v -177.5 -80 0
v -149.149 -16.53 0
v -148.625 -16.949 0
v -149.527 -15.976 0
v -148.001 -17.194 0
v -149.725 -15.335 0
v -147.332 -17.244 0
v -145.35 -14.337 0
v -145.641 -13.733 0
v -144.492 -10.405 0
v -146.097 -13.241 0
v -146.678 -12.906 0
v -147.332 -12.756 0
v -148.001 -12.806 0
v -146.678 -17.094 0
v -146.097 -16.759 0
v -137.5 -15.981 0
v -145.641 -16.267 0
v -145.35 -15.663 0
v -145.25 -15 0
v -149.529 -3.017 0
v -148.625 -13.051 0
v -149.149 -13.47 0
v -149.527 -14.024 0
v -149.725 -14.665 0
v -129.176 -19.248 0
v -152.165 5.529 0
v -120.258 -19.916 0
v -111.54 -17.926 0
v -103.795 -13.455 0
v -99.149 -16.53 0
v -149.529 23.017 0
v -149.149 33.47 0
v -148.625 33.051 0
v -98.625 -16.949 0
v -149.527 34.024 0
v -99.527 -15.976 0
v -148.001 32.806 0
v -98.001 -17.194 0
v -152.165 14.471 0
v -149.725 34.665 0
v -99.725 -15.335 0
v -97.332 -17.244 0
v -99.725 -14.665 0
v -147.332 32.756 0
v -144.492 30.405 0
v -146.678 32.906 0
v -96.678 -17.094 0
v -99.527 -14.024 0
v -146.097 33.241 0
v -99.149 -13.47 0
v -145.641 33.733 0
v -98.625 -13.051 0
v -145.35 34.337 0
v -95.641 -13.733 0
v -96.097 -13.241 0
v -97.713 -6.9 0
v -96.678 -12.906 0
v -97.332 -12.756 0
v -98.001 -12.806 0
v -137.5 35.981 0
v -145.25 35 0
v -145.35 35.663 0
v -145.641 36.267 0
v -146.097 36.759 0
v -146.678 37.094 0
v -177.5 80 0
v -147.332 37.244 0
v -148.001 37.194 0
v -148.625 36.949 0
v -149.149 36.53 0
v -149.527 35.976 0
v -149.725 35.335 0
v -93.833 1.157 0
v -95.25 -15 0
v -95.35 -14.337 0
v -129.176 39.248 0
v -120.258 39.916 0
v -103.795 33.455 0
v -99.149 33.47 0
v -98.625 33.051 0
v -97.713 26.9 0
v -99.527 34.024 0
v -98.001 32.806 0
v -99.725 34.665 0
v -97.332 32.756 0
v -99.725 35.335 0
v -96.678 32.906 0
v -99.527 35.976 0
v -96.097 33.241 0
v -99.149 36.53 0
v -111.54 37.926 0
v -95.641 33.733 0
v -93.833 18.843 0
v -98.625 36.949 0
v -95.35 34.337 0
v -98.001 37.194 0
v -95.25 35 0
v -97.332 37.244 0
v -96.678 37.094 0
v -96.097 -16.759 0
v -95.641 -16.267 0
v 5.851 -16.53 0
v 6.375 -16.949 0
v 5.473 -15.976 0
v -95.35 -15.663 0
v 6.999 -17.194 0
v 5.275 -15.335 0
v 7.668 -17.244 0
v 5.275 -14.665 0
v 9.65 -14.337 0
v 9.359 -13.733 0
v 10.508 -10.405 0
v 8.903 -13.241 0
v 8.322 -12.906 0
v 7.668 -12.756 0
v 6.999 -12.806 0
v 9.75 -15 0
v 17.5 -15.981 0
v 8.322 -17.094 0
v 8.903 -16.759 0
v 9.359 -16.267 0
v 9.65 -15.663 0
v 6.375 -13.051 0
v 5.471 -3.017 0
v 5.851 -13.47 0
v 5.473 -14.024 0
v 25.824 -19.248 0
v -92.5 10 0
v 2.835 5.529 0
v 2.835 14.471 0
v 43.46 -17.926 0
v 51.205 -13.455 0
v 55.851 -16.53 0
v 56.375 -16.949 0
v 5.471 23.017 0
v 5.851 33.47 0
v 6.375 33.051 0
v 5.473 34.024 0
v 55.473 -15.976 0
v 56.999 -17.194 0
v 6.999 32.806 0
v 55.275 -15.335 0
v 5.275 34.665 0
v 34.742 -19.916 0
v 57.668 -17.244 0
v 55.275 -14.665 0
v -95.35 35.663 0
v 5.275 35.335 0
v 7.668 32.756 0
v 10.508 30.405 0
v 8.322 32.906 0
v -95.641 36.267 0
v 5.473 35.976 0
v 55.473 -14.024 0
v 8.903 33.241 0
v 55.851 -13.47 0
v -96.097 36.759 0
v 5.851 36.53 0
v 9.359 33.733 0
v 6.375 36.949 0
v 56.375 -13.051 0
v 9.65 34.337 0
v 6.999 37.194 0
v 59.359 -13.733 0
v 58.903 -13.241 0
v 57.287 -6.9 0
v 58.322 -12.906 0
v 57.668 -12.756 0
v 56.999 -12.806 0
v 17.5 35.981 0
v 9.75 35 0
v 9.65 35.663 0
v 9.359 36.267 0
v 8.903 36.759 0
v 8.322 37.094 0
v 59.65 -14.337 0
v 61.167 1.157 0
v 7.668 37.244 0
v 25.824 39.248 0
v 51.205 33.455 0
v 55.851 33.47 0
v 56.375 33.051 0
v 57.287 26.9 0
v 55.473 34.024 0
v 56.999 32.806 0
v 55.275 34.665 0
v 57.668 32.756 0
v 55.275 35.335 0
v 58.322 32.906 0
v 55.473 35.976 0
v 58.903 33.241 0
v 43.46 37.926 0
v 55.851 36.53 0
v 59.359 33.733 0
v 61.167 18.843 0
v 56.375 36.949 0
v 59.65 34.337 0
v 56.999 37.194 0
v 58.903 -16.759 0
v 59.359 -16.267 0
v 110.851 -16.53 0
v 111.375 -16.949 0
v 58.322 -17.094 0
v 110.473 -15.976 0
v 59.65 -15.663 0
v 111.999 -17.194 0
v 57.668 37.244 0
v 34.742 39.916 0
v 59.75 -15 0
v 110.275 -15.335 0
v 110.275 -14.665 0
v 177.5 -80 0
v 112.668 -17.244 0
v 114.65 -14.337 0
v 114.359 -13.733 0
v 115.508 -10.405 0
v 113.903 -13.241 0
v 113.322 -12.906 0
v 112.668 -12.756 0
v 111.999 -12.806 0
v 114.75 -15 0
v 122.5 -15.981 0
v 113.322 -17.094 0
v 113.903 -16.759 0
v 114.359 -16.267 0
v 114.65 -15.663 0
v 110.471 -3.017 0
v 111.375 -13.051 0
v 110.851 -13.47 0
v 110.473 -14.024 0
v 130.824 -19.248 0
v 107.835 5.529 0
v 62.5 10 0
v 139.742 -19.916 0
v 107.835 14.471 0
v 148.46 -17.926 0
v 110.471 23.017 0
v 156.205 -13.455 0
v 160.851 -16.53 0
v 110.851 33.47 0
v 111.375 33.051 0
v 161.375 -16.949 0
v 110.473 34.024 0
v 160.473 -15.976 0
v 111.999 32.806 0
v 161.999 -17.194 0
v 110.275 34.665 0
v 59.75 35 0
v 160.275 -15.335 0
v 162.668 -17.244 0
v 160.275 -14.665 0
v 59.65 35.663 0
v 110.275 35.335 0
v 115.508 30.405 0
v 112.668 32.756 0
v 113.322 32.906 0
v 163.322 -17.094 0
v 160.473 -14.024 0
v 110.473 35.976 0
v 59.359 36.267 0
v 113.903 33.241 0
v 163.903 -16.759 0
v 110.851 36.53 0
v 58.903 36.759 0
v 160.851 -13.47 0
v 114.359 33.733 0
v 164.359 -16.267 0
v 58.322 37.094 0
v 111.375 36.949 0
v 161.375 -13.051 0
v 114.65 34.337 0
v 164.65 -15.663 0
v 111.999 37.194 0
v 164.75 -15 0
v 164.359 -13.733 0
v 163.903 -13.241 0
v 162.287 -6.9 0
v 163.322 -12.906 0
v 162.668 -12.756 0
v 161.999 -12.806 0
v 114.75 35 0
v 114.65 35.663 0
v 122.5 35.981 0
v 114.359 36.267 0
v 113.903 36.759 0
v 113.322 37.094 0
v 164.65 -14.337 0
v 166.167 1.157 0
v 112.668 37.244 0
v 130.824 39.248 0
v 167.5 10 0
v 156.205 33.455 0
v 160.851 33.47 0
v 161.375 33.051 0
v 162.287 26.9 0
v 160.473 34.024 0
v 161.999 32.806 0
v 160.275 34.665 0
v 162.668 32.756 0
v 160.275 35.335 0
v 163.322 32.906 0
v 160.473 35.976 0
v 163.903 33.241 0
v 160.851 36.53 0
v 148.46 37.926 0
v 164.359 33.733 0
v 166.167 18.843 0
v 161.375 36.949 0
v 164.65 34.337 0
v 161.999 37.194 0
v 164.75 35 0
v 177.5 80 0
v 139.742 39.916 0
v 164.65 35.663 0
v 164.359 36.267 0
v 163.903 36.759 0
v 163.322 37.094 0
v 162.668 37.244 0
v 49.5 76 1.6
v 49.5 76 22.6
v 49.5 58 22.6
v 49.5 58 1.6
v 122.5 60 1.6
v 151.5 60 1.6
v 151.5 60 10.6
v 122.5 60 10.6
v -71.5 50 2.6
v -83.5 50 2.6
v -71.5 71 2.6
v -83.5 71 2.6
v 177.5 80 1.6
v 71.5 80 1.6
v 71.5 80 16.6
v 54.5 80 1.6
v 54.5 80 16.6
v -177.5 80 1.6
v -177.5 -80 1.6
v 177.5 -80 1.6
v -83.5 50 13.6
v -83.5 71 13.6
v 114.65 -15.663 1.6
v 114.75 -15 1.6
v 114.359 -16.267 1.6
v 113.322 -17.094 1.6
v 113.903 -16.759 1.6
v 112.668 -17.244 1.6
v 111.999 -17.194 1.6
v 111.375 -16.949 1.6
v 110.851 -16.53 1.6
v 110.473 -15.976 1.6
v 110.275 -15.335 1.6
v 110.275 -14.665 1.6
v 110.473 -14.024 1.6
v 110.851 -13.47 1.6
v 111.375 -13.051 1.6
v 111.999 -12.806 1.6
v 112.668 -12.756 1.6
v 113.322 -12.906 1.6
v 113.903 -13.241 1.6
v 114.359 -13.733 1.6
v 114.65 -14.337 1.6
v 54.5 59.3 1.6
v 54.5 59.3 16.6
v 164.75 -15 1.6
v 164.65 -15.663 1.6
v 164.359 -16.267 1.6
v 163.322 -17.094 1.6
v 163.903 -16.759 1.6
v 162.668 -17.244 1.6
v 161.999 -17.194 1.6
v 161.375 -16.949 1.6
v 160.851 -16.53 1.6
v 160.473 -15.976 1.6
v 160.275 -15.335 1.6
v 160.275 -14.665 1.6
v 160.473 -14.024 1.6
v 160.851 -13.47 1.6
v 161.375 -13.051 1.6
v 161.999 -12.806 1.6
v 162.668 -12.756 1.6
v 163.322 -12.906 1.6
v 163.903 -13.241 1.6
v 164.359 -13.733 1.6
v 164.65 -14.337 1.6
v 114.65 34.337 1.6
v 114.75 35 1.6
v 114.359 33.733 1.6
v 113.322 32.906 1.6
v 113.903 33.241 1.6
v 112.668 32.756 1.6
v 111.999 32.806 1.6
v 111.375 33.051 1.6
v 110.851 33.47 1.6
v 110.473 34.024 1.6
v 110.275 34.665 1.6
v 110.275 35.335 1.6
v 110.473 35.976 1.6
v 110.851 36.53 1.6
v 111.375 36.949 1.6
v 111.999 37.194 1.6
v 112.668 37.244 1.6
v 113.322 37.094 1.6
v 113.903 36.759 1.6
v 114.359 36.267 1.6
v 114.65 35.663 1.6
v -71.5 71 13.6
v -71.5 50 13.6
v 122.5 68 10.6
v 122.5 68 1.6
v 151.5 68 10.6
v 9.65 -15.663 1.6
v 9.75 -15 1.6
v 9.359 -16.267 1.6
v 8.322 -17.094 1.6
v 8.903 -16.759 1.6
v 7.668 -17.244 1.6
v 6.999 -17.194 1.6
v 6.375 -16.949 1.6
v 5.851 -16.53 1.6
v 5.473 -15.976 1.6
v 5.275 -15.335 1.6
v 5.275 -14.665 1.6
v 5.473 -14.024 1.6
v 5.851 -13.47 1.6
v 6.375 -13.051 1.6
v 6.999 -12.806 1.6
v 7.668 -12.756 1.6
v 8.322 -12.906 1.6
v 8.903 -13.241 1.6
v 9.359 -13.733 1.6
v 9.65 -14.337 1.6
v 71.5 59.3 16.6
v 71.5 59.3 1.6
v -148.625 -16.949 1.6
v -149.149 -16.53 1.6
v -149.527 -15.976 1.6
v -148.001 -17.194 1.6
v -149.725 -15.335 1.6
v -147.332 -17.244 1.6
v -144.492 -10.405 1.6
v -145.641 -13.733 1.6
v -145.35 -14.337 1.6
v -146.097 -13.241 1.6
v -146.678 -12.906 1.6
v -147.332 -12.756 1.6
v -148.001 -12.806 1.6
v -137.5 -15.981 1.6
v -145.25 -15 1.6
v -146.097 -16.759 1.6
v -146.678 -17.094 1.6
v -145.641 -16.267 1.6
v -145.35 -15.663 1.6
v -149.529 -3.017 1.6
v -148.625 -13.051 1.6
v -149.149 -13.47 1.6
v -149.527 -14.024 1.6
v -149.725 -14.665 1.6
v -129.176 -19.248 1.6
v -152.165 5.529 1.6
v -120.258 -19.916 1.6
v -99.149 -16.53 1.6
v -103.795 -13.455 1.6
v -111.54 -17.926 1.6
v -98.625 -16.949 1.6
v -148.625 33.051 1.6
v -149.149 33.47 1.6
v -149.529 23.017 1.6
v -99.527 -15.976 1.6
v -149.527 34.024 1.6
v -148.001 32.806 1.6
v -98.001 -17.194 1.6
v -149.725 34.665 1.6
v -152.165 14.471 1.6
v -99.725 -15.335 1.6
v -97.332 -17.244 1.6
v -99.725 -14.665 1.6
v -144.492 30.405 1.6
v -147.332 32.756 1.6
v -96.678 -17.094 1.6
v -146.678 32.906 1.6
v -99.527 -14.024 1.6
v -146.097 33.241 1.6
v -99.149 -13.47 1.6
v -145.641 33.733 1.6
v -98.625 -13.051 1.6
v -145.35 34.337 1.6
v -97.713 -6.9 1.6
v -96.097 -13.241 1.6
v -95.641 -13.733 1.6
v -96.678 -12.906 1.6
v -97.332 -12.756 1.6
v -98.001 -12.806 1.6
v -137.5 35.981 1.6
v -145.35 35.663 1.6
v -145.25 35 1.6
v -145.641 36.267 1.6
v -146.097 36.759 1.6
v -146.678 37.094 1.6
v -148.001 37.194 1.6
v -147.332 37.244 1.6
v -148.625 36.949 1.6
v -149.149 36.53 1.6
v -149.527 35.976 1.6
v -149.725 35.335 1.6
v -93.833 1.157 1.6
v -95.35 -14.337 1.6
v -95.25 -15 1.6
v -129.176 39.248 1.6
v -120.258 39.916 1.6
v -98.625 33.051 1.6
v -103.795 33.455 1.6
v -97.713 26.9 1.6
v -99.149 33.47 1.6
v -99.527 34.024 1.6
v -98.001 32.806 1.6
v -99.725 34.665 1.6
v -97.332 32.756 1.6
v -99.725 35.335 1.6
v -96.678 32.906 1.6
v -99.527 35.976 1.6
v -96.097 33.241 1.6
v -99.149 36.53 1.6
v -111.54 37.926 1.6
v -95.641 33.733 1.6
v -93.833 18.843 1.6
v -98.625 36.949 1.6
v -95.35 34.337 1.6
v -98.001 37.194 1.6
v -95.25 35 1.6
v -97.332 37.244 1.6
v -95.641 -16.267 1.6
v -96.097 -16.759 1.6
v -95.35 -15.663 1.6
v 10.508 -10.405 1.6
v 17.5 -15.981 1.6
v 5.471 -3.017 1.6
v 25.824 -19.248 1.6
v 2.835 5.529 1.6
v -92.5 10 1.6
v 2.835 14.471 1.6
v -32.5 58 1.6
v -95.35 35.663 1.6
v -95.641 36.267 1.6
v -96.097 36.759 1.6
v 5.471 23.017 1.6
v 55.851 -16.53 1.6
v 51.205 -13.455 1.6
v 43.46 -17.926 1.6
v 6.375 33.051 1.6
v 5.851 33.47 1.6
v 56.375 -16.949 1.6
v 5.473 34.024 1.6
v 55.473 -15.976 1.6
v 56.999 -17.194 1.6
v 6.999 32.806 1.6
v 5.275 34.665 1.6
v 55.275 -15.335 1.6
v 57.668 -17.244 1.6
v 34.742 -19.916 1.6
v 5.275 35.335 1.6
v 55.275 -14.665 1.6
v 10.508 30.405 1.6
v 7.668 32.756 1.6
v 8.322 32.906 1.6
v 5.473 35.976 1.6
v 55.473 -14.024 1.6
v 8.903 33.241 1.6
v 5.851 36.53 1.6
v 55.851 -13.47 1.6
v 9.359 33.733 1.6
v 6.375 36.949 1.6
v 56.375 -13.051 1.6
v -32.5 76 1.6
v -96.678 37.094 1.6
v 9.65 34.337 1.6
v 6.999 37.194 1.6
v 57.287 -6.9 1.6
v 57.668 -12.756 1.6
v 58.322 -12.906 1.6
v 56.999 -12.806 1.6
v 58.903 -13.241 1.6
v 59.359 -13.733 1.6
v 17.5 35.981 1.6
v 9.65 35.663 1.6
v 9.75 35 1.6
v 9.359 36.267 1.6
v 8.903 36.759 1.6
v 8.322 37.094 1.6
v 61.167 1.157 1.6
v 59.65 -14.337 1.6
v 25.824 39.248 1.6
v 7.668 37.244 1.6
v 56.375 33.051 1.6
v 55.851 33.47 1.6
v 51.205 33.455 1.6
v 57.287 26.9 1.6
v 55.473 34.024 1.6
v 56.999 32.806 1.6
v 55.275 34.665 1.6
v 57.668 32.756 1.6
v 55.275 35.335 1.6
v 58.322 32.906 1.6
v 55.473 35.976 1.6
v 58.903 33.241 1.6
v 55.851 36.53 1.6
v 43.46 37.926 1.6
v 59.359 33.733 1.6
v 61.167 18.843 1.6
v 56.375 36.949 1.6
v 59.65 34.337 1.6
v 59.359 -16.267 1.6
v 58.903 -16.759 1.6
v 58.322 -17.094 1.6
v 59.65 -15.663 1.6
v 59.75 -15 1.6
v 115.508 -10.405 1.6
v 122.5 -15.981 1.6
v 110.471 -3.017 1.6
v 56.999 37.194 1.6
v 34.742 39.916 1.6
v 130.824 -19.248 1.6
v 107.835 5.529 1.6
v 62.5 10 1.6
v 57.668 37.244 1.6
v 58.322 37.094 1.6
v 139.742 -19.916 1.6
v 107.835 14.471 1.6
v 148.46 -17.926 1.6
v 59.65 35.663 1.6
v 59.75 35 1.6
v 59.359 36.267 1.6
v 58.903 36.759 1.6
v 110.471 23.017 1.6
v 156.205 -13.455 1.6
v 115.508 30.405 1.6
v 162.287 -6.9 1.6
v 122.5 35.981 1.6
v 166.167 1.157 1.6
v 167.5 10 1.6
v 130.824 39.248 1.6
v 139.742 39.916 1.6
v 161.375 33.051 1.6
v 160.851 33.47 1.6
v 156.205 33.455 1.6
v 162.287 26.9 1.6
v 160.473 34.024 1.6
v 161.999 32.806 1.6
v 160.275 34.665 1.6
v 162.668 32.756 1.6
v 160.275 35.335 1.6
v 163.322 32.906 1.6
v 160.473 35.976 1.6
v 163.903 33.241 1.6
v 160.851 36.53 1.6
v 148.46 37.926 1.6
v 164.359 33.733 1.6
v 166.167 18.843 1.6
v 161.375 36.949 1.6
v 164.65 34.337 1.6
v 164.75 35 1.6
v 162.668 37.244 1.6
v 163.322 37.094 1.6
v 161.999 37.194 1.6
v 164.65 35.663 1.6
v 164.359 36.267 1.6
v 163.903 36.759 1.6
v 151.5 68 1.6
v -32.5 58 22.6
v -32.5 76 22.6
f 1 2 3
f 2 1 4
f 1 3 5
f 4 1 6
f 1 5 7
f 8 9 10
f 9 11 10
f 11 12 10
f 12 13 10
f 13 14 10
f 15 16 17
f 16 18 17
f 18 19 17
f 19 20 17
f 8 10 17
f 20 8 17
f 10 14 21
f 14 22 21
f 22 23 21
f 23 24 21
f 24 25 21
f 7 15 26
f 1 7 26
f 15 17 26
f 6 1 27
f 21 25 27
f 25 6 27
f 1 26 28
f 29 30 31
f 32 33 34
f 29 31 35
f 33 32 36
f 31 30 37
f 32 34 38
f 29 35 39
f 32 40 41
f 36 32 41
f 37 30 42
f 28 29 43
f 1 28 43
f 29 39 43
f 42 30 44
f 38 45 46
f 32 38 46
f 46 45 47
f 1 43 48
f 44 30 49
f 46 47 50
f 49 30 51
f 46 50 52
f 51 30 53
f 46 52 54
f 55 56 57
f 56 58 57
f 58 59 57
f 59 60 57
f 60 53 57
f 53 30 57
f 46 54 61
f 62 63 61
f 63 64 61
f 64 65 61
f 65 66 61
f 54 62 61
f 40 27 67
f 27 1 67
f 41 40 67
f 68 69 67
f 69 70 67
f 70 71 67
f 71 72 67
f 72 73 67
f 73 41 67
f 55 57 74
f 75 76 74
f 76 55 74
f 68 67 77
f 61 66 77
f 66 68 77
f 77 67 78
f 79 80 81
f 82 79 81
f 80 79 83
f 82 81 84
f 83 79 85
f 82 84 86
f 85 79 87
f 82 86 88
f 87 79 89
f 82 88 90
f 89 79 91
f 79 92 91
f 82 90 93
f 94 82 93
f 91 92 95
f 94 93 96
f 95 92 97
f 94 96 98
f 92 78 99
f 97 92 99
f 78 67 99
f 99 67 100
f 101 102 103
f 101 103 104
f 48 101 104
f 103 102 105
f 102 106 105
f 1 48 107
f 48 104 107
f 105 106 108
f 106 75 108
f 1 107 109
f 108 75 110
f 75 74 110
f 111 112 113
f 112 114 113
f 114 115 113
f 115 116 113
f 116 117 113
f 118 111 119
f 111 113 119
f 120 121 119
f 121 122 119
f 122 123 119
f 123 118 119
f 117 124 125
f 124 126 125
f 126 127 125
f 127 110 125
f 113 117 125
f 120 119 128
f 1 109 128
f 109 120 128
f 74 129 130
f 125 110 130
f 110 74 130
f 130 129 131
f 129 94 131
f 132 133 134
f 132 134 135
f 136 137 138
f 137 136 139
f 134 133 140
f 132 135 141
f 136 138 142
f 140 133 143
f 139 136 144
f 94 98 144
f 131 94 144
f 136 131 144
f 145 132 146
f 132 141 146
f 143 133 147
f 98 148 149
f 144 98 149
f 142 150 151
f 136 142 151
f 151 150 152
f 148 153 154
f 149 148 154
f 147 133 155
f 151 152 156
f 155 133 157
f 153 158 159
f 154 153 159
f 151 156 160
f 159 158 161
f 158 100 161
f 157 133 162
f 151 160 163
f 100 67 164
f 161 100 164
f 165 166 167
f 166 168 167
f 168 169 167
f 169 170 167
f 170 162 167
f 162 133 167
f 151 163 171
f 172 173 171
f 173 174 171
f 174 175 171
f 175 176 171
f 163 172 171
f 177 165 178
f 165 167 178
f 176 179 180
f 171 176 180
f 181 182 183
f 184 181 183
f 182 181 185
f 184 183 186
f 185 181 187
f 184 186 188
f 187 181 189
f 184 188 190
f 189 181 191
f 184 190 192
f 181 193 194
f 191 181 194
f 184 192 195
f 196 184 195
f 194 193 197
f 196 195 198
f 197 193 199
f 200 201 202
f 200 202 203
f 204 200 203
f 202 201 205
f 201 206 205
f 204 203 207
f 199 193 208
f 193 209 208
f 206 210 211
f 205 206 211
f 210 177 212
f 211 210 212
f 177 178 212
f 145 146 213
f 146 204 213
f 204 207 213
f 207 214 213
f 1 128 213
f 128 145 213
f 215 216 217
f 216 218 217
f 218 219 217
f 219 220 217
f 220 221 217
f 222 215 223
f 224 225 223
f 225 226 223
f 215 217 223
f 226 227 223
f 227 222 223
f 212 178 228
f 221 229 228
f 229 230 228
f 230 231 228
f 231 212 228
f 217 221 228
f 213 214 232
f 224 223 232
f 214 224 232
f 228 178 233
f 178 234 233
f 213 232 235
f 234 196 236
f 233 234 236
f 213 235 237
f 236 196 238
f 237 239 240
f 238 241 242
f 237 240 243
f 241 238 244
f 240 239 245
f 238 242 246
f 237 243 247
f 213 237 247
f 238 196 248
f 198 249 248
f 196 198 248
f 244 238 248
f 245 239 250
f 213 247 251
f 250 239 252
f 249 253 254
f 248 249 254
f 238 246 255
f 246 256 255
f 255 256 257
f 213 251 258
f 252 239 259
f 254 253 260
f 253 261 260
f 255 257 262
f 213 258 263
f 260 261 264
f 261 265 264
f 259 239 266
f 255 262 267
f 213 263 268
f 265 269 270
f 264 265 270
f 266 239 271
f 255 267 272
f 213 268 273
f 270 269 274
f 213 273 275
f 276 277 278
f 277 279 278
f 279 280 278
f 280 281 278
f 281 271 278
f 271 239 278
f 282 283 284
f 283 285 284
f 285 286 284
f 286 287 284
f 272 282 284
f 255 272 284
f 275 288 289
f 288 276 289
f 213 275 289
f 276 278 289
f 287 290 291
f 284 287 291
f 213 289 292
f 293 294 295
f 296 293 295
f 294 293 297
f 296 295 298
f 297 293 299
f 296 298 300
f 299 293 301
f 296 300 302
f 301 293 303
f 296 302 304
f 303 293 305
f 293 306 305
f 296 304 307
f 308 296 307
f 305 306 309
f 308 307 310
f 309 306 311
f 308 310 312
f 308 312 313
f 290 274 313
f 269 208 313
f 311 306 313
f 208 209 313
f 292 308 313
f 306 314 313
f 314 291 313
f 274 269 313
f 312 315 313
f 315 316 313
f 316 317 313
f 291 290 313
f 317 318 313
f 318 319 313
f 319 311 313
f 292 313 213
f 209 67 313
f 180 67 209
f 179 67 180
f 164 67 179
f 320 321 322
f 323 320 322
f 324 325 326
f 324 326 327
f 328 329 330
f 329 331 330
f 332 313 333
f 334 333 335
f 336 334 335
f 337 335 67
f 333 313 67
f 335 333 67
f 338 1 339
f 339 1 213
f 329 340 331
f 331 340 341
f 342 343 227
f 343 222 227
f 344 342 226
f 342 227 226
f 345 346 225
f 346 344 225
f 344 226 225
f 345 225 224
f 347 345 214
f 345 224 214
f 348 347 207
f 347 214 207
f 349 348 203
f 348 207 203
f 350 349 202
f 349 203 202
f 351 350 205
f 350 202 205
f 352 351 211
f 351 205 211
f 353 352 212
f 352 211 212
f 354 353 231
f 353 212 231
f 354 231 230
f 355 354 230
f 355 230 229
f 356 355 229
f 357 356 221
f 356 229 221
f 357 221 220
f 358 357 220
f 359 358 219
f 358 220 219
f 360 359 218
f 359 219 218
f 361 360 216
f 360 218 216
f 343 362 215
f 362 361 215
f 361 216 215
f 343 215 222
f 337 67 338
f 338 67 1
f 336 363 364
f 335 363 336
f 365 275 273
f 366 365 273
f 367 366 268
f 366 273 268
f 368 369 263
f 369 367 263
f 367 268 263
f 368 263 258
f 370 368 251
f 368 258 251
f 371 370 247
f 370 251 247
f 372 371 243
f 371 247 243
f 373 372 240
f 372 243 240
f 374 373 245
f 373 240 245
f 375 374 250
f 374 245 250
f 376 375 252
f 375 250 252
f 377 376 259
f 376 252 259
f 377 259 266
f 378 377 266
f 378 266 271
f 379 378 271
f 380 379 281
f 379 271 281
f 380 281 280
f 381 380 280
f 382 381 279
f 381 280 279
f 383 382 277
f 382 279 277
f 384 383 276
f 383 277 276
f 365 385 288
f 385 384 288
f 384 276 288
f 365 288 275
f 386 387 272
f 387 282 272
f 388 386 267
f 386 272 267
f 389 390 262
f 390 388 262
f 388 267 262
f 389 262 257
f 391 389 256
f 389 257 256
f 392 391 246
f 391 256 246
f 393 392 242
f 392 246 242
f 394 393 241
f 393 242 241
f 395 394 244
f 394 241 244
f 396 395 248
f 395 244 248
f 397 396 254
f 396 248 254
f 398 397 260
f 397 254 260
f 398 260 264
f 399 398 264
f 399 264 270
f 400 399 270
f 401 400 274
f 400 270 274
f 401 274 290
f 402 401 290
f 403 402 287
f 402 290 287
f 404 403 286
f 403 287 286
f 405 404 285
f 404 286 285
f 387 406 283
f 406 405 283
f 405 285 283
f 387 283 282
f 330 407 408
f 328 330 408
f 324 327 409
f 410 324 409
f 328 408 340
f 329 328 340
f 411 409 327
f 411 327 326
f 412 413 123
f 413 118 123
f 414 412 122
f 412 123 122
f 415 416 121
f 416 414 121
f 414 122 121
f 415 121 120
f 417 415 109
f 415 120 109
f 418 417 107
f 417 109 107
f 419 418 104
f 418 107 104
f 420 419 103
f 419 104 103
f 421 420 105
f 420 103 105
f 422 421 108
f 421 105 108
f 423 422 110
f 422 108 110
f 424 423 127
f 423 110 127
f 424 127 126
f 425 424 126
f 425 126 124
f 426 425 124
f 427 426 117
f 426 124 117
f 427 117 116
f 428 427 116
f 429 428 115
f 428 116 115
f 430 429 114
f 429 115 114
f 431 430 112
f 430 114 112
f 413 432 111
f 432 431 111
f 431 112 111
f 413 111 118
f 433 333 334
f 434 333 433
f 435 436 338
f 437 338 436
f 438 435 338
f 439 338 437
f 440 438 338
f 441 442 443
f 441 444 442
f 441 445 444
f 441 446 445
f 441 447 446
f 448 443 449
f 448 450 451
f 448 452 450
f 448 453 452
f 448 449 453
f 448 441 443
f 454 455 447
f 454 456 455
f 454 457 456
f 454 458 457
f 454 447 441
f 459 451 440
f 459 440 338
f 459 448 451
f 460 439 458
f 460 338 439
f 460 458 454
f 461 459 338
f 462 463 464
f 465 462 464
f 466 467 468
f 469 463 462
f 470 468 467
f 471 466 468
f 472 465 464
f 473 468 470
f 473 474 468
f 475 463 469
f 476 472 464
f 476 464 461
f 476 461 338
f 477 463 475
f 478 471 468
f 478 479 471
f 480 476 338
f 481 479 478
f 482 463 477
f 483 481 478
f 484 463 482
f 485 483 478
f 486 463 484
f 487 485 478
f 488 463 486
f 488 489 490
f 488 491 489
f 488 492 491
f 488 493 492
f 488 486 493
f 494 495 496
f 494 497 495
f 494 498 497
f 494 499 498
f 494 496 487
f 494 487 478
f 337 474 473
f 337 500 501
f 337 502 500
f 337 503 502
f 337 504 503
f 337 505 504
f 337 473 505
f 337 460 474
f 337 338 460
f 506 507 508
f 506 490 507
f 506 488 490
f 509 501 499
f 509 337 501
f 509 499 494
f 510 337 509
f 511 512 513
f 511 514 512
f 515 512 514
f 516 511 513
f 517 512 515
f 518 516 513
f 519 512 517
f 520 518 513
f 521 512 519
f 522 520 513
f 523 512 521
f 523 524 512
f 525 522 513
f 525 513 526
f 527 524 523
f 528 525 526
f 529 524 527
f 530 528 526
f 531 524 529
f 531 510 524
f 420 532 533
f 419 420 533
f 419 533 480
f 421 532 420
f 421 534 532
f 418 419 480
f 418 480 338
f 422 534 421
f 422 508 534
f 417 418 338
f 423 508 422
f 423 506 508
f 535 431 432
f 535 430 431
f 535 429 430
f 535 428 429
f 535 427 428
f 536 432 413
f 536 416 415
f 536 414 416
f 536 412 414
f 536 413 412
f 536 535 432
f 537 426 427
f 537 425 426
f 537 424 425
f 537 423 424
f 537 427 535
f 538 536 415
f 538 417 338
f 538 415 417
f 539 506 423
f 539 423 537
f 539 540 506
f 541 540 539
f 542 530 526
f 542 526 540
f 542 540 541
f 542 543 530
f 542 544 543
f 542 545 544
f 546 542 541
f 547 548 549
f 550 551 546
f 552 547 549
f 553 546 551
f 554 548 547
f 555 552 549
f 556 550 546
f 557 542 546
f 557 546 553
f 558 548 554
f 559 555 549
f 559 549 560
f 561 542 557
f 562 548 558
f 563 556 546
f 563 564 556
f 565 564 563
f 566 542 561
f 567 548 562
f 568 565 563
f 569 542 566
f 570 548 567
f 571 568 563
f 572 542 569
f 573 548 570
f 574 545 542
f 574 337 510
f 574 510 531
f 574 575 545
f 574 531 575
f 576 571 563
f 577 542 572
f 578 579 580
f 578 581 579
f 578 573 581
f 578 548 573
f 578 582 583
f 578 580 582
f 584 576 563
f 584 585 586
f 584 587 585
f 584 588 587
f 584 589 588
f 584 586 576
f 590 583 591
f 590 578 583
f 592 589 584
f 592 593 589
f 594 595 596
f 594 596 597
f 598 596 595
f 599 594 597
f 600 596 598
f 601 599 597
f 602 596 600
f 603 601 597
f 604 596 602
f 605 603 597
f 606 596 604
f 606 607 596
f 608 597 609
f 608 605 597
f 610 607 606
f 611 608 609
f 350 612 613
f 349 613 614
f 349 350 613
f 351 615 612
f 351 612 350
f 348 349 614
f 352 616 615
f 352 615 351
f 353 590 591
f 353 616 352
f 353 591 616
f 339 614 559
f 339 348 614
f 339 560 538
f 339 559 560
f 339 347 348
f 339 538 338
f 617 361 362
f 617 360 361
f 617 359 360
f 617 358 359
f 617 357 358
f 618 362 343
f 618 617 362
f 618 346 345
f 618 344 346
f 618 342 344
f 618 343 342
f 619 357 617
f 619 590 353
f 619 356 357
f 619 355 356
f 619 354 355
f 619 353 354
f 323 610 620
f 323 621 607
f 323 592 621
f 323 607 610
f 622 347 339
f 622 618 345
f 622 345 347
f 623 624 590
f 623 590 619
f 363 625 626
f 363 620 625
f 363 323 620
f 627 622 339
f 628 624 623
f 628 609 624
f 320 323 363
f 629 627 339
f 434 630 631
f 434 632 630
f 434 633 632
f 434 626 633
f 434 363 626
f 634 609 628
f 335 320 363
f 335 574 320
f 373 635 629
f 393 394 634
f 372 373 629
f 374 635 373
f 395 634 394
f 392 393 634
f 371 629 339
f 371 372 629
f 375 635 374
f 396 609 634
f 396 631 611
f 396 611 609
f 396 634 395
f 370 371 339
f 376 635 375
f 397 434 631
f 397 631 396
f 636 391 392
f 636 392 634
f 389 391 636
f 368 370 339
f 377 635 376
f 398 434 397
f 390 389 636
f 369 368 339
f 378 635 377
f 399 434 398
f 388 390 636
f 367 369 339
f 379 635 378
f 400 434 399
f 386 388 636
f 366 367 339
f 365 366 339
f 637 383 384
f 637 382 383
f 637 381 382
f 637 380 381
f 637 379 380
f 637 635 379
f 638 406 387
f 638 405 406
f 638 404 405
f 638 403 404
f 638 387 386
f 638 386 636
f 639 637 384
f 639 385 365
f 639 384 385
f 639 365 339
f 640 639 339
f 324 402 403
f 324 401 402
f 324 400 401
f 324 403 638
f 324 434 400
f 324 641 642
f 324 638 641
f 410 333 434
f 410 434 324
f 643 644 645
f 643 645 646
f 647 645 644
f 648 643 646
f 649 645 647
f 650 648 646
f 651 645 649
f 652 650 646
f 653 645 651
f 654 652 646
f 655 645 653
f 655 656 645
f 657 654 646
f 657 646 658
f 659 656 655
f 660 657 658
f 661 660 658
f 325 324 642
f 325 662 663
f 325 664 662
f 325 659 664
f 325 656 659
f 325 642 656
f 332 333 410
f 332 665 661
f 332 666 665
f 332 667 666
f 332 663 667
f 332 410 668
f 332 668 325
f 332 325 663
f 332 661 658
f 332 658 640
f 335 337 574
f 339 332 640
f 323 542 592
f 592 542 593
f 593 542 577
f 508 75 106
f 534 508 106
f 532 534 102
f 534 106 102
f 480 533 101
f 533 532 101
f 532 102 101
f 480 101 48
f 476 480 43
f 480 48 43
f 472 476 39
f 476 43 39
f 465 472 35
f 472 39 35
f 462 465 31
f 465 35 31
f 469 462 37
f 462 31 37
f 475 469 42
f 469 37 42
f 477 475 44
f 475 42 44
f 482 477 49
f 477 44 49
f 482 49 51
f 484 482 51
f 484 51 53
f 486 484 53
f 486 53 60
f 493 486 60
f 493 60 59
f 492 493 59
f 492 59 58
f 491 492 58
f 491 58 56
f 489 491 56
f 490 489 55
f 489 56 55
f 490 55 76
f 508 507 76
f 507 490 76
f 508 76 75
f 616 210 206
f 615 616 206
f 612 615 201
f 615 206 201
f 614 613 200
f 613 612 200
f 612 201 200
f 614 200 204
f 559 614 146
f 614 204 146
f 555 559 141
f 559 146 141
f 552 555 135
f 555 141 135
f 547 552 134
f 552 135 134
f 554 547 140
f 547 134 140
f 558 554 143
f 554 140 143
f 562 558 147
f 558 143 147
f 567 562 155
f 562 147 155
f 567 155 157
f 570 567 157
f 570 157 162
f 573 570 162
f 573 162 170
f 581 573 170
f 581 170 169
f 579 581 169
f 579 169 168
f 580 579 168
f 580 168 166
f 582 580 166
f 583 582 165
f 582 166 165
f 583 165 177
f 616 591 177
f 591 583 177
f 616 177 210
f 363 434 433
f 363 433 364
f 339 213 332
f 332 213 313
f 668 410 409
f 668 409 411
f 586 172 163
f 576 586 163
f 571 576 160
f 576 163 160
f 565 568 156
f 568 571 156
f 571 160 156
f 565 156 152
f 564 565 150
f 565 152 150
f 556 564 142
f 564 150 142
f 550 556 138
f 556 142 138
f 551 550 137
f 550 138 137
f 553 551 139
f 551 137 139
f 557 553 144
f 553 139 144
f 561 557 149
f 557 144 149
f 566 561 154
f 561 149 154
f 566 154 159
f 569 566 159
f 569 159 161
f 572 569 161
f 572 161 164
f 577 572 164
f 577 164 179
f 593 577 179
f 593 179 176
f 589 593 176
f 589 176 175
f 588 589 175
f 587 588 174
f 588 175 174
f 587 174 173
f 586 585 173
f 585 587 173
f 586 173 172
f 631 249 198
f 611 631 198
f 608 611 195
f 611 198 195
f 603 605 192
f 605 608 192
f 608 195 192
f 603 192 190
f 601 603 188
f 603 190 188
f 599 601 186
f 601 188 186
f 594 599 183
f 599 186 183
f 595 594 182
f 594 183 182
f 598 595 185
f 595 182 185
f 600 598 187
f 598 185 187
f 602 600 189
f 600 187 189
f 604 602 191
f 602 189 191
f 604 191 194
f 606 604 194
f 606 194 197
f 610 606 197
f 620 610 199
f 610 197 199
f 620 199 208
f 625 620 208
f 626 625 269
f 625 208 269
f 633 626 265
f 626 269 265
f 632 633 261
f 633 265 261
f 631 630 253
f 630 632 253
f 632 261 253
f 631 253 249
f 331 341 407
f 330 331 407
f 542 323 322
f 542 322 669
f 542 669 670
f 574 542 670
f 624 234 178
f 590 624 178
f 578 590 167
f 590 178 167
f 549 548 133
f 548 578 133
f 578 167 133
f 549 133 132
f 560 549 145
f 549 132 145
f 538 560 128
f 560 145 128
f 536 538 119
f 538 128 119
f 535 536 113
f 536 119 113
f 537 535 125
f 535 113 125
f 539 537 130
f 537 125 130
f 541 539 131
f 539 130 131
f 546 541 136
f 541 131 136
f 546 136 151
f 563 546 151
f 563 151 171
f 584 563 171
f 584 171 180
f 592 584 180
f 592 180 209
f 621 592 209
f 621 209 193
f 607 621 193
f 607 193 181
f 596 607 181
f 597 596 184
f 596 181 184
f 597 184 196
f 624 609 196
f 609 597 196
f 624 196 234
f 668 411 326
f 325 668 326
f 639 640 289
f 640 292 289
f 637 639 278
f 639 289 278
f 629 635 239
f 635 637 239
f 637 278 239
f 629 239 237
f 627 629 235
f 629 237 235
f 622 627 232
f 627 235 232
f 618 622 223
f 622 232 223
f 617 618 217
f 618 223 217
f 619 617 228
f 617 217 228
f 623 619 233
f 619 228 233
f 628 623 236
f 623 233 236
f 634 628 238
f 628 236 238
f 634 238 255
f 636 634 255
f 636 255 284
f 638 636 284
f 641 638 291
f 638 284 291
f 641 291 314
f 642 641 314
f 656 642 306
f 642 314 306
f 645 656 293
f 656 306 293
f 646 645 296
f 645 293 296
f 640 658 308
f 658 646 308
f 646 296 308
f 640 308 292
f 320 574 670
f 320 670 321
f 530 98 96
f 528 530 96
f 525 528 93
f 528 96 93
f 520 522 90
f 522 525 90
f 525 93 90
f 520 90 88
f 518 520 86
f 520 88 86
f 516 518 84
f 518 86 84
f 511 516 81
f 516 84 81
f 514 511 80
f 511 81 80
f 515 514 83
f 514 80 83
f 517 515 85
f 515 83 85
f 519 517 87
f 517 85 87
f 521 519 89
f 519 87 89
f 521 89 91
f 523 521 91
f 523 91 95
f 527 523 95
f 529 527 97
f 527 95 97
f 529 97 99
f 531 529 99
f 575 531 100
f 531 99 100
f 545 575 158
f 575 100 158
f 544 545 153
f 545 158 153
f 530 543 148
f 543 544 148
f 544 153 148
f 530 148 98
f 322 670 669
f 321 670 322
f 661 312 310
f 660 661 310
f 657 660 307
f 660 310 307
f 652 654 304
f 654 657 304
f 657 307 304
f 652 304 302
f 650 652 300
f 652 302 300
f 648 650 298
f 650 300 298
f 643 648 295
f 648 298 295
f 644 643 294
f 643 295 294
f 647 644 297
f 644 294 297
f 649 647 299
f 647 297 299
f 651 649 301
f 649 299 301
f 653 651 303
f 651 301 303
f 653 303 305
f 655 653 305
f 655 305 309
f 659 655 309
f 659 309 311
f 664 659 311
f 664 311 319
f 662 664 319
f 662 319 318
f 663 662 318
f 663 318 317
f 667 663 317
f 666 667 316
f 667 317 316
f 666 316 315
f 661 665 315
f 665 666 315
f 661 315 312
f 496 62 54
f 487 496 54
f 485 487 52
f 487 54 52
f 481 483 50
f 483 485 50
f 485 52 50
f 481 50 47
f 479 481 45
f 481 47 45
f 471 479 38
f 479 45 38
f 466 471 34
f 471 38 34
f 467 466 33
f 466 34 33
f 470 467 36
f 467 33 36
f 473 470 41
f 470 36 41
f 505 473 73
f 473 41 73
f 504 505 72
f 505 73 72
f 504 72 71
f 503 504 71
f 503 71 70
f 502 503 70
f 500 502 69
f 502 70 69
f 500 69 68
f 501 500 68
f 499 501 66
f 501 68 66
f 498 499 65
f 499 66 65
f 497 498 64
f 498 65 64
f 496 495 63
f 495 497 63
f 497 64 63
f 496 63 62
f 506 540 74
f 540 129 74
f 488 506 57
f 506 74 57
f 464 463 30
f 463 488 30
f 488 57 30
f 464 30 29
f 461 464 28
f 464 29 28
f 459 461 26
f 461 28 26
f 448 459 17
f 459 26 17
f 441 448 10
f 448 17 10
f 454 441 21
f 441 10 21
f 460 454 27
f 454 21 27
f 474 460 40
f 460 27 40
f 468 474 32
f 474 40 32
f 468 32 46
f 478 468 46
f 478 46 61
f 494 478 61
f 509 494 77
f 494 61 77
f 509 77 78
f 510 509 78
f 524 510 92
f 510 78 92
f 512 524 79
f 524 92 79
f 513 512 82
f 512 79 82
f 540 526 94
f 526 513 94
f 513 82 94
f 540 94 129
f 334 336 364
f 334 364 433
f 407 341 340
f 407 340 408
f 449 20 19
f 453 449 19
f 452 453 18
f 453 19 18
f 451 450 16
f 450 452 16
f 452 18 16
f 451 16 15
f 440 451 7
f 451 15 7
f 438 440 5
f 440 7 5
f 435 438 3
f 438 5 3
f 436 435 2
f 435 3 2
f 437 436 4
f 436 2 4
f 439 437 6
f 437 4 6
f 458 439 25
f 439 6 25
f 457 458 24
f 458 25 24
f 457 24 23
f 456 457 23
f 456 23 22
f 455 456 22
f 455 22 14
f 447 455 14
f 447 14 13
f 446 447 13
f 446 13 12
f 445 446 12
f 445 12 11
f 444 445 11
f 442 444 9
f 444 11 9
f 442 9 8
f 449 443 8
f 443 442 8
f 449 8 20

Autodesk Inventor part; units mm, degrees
ref_plane "YZ Plane" through (0, 0, 0) normal (1, 0, 0) x (0, 1, 0)
sketch "Sketch1" plane through (0, 0, 0) normal (0, 0, 1) x (1, 0, 0)
  line L0 (-177.5, -80) -> (177.5, -80)
  line L1 (177.5, -80) -> (177.5, 80)
  line L2 (177.5, 80) -> (-177.5, 80)
  line L3 (-177.5, 80) -> (-177.5, -80)
  line L4 (-177.5, -80) -> (177.5, 80) construction
  line L5 (177.5, -80) -> (-177.5, 80) construction
  circle A0 centre (-122.5, 10) radius 30
  circle A1 centre (32.5, 10) radius 30
  circle A2 centre (137.5, 10) radius 30
  line L6 (-152.5, 80) -> (-152.5, -80) construction
  line L7 (2.5, 80) -> (2.5, -80) construction
  line L8 (107.5, -80) -> (107.5, 80) construction
  line L9 (-177.5, -20) -> (177.5, -20) construction
  line L10 (-147.5, -15) -> (-97.5, -15) construction
  line L11 (-97.5, -15) -> (-97.5, 35) construction
  line L12 (-97.5, 35) -> (-147.5, 35) construction
  line L13 (-147.5, 35) -> (-147.5, -15) construction
  line L14 (-147.5, -15) -> (-97.5, 35) construction
  line L15 (-97.5, -15) -> (-147.5, 35) construction
  line L16 (7.5, -15) -> (57.5, -15) construction
  line L17 (57.5, -15) -> (57.5, 35) construction
  line L18 (57.5, 35) -> (7.5, 35) construction
  line L19 (7.5, 35) -> (7.5, -15) construction
  line L20 (7.5, -15) -> (57.5, 35) construction
  line L21 (57.5, -15) -> (7.5, 35) construction
  line L22 (112.5, -15) -> (162.5, -15) construction
  line L23 (162.5, -15) -> (162.5, 35) construction
  line L24 (162.5, 35) -> (112.5, 35) construction
  line L25 (112.5, 35) -> (112.5, -15) construction
  line L26 (112.5, -15) -> (162.5, 35) construction
  line L27 (162.5, -15) -> (112.5, 35) construction
  circle A3 centre (-147.5, 35) radius 2.25
  circle A4 centre (-97.5, 35) radius 2.25
  circle A5 centre (-97.5, -15) radius 2.25
  circle A6 centre (-147.5, -15) radius 2.25
  circle A7 centre (7.5, 35) radius 2.25
  circle A8 centre (57.5, 35) radius 2.25
  circle A9 centre (57.5, -15) radius 2.25
  circle A10 centre (7.5, -15) radius 2.25
  circle A11 centre (112.5, 35) radius 2.25
  circle A12 centre (162.5, 35) radius 2.25
  circle A13 centre (162.5, -15) radius 2.25
  circle A14 centre (112.5, -15) radius 2.25
  point P0 (0, 0)
  dimension "d0" = 160
  dimension "d1" = 355
  dimension "d4" = 25
  dimension "d6" = 180
  dimension "d8" = 285
  dimension "d9" = 100
  dimension "d10" = 60
  dimension "d11" = 50
  dimension "d12" = 4.5
extrude "PCB" add sketch "Sketch1" along normal blind 1.6
ref_plane "Work Plane1" through (0, 0, 2.6) normal (0, 0, 1) x (1, 0, 0)
ref_plane "Work Plane2" through (0, 0, 13.6) normal (0, 0, 1) x (1, 0, 0)
sketch "Sketch2" plane through (0, 0, 1.6) normal (0, 0, 1) x (1, 0, 0)
  line L0 (-177.5, 80) -> (-177.5, -80) construction
  line L1 (177.5, 80) -> (-177.5, 80) construction
  line L2 (-83.5, 71) -> (-71.5, 71)
  line L3 (-71.5, 71) -> (-71.5, 50)
  line L4 (-71.5, 50) -> (-83.5, 50)
  line L5 (-83.5, 50) -> (-83.5, 71)
  point P0 (0, 0)
  dimension "d15" = 94
  dimension "d16" = 106
  dimension "d17" = 9
  dimension "d18" = 30
extrude "USB" add sketch "Sketch2" against normal up to surface (11 mm away) from surface at 12
sketch "Sketch3" plane through (0, 0, 1.6) normal (0, 0, 1) x (1, 0, 0)
  line L0 (-32.5, 76) -> (49.5, 76)
  line L1 (49.5, 76) -> (49.5, 58)
  line L2 (49.5, 58) -> (-32.5, 58)
  line L3 (-32.5, 58) -> (-32.5, 76)
  line L4 (-177.5, 80) -> (-177.5, -80) construction
  line L5 (177.5, 80) -> (-177.5, 80) construction
  point P0 (0, 0)
  dimension "d21" = 145
  dimension "d22" = 227
  dimension "d23" = 4
  dimension "d24" = 22
extrude "Extrusion3" add sketch "Sketch3" along normal blind 21
sketch "Sketch4" plane through (0, 0, 1.6) normal (0, 0, 1) x (1, 0, 0)
  line L0 (122.5, 68) -> (151.5, 68)
  line L1 (151.5, 68) -> (151.5, 60)
  line L2 (151.5, 60) -> (122.5, 60)
  line L3 (122.5, 60) -> (122.5, 68)
  line L4 (177.5, -80) -> (177.5, 80) construction
  line L5 (177.5, 80) -> (-177.5, 80) construction
  point P0 (0, 0)
  dimension "d27" = 26
  dimension "d28" = 55
  dimension "d29" = 12
  dimension "d30" = 20
extrude "Extrusion4" add sketch "Sketch4" along normal blind 9
sketch "Sketch5" plane through (0, 0, 1.6) normal (0, 0, 1) x (1, 0, 0)
  line L0 (177.5, 80) -> (-177.5, 80) projected
  line L1 (71.5, 80) -> (71.5, 59.3001)
  line L2 (71.5, 59.3001) -> (54.5, 59.3001)
  line L3 (54.5, 59.3001) -> (54.5, 80)
  point P0 (0, 0)
  dimension "d33" = 249
  dimension "d34" = 232
extrude "Extrusion5" add sketch "Sketch5" along normal blind 15
properties part number "PCB" material "Gold"
